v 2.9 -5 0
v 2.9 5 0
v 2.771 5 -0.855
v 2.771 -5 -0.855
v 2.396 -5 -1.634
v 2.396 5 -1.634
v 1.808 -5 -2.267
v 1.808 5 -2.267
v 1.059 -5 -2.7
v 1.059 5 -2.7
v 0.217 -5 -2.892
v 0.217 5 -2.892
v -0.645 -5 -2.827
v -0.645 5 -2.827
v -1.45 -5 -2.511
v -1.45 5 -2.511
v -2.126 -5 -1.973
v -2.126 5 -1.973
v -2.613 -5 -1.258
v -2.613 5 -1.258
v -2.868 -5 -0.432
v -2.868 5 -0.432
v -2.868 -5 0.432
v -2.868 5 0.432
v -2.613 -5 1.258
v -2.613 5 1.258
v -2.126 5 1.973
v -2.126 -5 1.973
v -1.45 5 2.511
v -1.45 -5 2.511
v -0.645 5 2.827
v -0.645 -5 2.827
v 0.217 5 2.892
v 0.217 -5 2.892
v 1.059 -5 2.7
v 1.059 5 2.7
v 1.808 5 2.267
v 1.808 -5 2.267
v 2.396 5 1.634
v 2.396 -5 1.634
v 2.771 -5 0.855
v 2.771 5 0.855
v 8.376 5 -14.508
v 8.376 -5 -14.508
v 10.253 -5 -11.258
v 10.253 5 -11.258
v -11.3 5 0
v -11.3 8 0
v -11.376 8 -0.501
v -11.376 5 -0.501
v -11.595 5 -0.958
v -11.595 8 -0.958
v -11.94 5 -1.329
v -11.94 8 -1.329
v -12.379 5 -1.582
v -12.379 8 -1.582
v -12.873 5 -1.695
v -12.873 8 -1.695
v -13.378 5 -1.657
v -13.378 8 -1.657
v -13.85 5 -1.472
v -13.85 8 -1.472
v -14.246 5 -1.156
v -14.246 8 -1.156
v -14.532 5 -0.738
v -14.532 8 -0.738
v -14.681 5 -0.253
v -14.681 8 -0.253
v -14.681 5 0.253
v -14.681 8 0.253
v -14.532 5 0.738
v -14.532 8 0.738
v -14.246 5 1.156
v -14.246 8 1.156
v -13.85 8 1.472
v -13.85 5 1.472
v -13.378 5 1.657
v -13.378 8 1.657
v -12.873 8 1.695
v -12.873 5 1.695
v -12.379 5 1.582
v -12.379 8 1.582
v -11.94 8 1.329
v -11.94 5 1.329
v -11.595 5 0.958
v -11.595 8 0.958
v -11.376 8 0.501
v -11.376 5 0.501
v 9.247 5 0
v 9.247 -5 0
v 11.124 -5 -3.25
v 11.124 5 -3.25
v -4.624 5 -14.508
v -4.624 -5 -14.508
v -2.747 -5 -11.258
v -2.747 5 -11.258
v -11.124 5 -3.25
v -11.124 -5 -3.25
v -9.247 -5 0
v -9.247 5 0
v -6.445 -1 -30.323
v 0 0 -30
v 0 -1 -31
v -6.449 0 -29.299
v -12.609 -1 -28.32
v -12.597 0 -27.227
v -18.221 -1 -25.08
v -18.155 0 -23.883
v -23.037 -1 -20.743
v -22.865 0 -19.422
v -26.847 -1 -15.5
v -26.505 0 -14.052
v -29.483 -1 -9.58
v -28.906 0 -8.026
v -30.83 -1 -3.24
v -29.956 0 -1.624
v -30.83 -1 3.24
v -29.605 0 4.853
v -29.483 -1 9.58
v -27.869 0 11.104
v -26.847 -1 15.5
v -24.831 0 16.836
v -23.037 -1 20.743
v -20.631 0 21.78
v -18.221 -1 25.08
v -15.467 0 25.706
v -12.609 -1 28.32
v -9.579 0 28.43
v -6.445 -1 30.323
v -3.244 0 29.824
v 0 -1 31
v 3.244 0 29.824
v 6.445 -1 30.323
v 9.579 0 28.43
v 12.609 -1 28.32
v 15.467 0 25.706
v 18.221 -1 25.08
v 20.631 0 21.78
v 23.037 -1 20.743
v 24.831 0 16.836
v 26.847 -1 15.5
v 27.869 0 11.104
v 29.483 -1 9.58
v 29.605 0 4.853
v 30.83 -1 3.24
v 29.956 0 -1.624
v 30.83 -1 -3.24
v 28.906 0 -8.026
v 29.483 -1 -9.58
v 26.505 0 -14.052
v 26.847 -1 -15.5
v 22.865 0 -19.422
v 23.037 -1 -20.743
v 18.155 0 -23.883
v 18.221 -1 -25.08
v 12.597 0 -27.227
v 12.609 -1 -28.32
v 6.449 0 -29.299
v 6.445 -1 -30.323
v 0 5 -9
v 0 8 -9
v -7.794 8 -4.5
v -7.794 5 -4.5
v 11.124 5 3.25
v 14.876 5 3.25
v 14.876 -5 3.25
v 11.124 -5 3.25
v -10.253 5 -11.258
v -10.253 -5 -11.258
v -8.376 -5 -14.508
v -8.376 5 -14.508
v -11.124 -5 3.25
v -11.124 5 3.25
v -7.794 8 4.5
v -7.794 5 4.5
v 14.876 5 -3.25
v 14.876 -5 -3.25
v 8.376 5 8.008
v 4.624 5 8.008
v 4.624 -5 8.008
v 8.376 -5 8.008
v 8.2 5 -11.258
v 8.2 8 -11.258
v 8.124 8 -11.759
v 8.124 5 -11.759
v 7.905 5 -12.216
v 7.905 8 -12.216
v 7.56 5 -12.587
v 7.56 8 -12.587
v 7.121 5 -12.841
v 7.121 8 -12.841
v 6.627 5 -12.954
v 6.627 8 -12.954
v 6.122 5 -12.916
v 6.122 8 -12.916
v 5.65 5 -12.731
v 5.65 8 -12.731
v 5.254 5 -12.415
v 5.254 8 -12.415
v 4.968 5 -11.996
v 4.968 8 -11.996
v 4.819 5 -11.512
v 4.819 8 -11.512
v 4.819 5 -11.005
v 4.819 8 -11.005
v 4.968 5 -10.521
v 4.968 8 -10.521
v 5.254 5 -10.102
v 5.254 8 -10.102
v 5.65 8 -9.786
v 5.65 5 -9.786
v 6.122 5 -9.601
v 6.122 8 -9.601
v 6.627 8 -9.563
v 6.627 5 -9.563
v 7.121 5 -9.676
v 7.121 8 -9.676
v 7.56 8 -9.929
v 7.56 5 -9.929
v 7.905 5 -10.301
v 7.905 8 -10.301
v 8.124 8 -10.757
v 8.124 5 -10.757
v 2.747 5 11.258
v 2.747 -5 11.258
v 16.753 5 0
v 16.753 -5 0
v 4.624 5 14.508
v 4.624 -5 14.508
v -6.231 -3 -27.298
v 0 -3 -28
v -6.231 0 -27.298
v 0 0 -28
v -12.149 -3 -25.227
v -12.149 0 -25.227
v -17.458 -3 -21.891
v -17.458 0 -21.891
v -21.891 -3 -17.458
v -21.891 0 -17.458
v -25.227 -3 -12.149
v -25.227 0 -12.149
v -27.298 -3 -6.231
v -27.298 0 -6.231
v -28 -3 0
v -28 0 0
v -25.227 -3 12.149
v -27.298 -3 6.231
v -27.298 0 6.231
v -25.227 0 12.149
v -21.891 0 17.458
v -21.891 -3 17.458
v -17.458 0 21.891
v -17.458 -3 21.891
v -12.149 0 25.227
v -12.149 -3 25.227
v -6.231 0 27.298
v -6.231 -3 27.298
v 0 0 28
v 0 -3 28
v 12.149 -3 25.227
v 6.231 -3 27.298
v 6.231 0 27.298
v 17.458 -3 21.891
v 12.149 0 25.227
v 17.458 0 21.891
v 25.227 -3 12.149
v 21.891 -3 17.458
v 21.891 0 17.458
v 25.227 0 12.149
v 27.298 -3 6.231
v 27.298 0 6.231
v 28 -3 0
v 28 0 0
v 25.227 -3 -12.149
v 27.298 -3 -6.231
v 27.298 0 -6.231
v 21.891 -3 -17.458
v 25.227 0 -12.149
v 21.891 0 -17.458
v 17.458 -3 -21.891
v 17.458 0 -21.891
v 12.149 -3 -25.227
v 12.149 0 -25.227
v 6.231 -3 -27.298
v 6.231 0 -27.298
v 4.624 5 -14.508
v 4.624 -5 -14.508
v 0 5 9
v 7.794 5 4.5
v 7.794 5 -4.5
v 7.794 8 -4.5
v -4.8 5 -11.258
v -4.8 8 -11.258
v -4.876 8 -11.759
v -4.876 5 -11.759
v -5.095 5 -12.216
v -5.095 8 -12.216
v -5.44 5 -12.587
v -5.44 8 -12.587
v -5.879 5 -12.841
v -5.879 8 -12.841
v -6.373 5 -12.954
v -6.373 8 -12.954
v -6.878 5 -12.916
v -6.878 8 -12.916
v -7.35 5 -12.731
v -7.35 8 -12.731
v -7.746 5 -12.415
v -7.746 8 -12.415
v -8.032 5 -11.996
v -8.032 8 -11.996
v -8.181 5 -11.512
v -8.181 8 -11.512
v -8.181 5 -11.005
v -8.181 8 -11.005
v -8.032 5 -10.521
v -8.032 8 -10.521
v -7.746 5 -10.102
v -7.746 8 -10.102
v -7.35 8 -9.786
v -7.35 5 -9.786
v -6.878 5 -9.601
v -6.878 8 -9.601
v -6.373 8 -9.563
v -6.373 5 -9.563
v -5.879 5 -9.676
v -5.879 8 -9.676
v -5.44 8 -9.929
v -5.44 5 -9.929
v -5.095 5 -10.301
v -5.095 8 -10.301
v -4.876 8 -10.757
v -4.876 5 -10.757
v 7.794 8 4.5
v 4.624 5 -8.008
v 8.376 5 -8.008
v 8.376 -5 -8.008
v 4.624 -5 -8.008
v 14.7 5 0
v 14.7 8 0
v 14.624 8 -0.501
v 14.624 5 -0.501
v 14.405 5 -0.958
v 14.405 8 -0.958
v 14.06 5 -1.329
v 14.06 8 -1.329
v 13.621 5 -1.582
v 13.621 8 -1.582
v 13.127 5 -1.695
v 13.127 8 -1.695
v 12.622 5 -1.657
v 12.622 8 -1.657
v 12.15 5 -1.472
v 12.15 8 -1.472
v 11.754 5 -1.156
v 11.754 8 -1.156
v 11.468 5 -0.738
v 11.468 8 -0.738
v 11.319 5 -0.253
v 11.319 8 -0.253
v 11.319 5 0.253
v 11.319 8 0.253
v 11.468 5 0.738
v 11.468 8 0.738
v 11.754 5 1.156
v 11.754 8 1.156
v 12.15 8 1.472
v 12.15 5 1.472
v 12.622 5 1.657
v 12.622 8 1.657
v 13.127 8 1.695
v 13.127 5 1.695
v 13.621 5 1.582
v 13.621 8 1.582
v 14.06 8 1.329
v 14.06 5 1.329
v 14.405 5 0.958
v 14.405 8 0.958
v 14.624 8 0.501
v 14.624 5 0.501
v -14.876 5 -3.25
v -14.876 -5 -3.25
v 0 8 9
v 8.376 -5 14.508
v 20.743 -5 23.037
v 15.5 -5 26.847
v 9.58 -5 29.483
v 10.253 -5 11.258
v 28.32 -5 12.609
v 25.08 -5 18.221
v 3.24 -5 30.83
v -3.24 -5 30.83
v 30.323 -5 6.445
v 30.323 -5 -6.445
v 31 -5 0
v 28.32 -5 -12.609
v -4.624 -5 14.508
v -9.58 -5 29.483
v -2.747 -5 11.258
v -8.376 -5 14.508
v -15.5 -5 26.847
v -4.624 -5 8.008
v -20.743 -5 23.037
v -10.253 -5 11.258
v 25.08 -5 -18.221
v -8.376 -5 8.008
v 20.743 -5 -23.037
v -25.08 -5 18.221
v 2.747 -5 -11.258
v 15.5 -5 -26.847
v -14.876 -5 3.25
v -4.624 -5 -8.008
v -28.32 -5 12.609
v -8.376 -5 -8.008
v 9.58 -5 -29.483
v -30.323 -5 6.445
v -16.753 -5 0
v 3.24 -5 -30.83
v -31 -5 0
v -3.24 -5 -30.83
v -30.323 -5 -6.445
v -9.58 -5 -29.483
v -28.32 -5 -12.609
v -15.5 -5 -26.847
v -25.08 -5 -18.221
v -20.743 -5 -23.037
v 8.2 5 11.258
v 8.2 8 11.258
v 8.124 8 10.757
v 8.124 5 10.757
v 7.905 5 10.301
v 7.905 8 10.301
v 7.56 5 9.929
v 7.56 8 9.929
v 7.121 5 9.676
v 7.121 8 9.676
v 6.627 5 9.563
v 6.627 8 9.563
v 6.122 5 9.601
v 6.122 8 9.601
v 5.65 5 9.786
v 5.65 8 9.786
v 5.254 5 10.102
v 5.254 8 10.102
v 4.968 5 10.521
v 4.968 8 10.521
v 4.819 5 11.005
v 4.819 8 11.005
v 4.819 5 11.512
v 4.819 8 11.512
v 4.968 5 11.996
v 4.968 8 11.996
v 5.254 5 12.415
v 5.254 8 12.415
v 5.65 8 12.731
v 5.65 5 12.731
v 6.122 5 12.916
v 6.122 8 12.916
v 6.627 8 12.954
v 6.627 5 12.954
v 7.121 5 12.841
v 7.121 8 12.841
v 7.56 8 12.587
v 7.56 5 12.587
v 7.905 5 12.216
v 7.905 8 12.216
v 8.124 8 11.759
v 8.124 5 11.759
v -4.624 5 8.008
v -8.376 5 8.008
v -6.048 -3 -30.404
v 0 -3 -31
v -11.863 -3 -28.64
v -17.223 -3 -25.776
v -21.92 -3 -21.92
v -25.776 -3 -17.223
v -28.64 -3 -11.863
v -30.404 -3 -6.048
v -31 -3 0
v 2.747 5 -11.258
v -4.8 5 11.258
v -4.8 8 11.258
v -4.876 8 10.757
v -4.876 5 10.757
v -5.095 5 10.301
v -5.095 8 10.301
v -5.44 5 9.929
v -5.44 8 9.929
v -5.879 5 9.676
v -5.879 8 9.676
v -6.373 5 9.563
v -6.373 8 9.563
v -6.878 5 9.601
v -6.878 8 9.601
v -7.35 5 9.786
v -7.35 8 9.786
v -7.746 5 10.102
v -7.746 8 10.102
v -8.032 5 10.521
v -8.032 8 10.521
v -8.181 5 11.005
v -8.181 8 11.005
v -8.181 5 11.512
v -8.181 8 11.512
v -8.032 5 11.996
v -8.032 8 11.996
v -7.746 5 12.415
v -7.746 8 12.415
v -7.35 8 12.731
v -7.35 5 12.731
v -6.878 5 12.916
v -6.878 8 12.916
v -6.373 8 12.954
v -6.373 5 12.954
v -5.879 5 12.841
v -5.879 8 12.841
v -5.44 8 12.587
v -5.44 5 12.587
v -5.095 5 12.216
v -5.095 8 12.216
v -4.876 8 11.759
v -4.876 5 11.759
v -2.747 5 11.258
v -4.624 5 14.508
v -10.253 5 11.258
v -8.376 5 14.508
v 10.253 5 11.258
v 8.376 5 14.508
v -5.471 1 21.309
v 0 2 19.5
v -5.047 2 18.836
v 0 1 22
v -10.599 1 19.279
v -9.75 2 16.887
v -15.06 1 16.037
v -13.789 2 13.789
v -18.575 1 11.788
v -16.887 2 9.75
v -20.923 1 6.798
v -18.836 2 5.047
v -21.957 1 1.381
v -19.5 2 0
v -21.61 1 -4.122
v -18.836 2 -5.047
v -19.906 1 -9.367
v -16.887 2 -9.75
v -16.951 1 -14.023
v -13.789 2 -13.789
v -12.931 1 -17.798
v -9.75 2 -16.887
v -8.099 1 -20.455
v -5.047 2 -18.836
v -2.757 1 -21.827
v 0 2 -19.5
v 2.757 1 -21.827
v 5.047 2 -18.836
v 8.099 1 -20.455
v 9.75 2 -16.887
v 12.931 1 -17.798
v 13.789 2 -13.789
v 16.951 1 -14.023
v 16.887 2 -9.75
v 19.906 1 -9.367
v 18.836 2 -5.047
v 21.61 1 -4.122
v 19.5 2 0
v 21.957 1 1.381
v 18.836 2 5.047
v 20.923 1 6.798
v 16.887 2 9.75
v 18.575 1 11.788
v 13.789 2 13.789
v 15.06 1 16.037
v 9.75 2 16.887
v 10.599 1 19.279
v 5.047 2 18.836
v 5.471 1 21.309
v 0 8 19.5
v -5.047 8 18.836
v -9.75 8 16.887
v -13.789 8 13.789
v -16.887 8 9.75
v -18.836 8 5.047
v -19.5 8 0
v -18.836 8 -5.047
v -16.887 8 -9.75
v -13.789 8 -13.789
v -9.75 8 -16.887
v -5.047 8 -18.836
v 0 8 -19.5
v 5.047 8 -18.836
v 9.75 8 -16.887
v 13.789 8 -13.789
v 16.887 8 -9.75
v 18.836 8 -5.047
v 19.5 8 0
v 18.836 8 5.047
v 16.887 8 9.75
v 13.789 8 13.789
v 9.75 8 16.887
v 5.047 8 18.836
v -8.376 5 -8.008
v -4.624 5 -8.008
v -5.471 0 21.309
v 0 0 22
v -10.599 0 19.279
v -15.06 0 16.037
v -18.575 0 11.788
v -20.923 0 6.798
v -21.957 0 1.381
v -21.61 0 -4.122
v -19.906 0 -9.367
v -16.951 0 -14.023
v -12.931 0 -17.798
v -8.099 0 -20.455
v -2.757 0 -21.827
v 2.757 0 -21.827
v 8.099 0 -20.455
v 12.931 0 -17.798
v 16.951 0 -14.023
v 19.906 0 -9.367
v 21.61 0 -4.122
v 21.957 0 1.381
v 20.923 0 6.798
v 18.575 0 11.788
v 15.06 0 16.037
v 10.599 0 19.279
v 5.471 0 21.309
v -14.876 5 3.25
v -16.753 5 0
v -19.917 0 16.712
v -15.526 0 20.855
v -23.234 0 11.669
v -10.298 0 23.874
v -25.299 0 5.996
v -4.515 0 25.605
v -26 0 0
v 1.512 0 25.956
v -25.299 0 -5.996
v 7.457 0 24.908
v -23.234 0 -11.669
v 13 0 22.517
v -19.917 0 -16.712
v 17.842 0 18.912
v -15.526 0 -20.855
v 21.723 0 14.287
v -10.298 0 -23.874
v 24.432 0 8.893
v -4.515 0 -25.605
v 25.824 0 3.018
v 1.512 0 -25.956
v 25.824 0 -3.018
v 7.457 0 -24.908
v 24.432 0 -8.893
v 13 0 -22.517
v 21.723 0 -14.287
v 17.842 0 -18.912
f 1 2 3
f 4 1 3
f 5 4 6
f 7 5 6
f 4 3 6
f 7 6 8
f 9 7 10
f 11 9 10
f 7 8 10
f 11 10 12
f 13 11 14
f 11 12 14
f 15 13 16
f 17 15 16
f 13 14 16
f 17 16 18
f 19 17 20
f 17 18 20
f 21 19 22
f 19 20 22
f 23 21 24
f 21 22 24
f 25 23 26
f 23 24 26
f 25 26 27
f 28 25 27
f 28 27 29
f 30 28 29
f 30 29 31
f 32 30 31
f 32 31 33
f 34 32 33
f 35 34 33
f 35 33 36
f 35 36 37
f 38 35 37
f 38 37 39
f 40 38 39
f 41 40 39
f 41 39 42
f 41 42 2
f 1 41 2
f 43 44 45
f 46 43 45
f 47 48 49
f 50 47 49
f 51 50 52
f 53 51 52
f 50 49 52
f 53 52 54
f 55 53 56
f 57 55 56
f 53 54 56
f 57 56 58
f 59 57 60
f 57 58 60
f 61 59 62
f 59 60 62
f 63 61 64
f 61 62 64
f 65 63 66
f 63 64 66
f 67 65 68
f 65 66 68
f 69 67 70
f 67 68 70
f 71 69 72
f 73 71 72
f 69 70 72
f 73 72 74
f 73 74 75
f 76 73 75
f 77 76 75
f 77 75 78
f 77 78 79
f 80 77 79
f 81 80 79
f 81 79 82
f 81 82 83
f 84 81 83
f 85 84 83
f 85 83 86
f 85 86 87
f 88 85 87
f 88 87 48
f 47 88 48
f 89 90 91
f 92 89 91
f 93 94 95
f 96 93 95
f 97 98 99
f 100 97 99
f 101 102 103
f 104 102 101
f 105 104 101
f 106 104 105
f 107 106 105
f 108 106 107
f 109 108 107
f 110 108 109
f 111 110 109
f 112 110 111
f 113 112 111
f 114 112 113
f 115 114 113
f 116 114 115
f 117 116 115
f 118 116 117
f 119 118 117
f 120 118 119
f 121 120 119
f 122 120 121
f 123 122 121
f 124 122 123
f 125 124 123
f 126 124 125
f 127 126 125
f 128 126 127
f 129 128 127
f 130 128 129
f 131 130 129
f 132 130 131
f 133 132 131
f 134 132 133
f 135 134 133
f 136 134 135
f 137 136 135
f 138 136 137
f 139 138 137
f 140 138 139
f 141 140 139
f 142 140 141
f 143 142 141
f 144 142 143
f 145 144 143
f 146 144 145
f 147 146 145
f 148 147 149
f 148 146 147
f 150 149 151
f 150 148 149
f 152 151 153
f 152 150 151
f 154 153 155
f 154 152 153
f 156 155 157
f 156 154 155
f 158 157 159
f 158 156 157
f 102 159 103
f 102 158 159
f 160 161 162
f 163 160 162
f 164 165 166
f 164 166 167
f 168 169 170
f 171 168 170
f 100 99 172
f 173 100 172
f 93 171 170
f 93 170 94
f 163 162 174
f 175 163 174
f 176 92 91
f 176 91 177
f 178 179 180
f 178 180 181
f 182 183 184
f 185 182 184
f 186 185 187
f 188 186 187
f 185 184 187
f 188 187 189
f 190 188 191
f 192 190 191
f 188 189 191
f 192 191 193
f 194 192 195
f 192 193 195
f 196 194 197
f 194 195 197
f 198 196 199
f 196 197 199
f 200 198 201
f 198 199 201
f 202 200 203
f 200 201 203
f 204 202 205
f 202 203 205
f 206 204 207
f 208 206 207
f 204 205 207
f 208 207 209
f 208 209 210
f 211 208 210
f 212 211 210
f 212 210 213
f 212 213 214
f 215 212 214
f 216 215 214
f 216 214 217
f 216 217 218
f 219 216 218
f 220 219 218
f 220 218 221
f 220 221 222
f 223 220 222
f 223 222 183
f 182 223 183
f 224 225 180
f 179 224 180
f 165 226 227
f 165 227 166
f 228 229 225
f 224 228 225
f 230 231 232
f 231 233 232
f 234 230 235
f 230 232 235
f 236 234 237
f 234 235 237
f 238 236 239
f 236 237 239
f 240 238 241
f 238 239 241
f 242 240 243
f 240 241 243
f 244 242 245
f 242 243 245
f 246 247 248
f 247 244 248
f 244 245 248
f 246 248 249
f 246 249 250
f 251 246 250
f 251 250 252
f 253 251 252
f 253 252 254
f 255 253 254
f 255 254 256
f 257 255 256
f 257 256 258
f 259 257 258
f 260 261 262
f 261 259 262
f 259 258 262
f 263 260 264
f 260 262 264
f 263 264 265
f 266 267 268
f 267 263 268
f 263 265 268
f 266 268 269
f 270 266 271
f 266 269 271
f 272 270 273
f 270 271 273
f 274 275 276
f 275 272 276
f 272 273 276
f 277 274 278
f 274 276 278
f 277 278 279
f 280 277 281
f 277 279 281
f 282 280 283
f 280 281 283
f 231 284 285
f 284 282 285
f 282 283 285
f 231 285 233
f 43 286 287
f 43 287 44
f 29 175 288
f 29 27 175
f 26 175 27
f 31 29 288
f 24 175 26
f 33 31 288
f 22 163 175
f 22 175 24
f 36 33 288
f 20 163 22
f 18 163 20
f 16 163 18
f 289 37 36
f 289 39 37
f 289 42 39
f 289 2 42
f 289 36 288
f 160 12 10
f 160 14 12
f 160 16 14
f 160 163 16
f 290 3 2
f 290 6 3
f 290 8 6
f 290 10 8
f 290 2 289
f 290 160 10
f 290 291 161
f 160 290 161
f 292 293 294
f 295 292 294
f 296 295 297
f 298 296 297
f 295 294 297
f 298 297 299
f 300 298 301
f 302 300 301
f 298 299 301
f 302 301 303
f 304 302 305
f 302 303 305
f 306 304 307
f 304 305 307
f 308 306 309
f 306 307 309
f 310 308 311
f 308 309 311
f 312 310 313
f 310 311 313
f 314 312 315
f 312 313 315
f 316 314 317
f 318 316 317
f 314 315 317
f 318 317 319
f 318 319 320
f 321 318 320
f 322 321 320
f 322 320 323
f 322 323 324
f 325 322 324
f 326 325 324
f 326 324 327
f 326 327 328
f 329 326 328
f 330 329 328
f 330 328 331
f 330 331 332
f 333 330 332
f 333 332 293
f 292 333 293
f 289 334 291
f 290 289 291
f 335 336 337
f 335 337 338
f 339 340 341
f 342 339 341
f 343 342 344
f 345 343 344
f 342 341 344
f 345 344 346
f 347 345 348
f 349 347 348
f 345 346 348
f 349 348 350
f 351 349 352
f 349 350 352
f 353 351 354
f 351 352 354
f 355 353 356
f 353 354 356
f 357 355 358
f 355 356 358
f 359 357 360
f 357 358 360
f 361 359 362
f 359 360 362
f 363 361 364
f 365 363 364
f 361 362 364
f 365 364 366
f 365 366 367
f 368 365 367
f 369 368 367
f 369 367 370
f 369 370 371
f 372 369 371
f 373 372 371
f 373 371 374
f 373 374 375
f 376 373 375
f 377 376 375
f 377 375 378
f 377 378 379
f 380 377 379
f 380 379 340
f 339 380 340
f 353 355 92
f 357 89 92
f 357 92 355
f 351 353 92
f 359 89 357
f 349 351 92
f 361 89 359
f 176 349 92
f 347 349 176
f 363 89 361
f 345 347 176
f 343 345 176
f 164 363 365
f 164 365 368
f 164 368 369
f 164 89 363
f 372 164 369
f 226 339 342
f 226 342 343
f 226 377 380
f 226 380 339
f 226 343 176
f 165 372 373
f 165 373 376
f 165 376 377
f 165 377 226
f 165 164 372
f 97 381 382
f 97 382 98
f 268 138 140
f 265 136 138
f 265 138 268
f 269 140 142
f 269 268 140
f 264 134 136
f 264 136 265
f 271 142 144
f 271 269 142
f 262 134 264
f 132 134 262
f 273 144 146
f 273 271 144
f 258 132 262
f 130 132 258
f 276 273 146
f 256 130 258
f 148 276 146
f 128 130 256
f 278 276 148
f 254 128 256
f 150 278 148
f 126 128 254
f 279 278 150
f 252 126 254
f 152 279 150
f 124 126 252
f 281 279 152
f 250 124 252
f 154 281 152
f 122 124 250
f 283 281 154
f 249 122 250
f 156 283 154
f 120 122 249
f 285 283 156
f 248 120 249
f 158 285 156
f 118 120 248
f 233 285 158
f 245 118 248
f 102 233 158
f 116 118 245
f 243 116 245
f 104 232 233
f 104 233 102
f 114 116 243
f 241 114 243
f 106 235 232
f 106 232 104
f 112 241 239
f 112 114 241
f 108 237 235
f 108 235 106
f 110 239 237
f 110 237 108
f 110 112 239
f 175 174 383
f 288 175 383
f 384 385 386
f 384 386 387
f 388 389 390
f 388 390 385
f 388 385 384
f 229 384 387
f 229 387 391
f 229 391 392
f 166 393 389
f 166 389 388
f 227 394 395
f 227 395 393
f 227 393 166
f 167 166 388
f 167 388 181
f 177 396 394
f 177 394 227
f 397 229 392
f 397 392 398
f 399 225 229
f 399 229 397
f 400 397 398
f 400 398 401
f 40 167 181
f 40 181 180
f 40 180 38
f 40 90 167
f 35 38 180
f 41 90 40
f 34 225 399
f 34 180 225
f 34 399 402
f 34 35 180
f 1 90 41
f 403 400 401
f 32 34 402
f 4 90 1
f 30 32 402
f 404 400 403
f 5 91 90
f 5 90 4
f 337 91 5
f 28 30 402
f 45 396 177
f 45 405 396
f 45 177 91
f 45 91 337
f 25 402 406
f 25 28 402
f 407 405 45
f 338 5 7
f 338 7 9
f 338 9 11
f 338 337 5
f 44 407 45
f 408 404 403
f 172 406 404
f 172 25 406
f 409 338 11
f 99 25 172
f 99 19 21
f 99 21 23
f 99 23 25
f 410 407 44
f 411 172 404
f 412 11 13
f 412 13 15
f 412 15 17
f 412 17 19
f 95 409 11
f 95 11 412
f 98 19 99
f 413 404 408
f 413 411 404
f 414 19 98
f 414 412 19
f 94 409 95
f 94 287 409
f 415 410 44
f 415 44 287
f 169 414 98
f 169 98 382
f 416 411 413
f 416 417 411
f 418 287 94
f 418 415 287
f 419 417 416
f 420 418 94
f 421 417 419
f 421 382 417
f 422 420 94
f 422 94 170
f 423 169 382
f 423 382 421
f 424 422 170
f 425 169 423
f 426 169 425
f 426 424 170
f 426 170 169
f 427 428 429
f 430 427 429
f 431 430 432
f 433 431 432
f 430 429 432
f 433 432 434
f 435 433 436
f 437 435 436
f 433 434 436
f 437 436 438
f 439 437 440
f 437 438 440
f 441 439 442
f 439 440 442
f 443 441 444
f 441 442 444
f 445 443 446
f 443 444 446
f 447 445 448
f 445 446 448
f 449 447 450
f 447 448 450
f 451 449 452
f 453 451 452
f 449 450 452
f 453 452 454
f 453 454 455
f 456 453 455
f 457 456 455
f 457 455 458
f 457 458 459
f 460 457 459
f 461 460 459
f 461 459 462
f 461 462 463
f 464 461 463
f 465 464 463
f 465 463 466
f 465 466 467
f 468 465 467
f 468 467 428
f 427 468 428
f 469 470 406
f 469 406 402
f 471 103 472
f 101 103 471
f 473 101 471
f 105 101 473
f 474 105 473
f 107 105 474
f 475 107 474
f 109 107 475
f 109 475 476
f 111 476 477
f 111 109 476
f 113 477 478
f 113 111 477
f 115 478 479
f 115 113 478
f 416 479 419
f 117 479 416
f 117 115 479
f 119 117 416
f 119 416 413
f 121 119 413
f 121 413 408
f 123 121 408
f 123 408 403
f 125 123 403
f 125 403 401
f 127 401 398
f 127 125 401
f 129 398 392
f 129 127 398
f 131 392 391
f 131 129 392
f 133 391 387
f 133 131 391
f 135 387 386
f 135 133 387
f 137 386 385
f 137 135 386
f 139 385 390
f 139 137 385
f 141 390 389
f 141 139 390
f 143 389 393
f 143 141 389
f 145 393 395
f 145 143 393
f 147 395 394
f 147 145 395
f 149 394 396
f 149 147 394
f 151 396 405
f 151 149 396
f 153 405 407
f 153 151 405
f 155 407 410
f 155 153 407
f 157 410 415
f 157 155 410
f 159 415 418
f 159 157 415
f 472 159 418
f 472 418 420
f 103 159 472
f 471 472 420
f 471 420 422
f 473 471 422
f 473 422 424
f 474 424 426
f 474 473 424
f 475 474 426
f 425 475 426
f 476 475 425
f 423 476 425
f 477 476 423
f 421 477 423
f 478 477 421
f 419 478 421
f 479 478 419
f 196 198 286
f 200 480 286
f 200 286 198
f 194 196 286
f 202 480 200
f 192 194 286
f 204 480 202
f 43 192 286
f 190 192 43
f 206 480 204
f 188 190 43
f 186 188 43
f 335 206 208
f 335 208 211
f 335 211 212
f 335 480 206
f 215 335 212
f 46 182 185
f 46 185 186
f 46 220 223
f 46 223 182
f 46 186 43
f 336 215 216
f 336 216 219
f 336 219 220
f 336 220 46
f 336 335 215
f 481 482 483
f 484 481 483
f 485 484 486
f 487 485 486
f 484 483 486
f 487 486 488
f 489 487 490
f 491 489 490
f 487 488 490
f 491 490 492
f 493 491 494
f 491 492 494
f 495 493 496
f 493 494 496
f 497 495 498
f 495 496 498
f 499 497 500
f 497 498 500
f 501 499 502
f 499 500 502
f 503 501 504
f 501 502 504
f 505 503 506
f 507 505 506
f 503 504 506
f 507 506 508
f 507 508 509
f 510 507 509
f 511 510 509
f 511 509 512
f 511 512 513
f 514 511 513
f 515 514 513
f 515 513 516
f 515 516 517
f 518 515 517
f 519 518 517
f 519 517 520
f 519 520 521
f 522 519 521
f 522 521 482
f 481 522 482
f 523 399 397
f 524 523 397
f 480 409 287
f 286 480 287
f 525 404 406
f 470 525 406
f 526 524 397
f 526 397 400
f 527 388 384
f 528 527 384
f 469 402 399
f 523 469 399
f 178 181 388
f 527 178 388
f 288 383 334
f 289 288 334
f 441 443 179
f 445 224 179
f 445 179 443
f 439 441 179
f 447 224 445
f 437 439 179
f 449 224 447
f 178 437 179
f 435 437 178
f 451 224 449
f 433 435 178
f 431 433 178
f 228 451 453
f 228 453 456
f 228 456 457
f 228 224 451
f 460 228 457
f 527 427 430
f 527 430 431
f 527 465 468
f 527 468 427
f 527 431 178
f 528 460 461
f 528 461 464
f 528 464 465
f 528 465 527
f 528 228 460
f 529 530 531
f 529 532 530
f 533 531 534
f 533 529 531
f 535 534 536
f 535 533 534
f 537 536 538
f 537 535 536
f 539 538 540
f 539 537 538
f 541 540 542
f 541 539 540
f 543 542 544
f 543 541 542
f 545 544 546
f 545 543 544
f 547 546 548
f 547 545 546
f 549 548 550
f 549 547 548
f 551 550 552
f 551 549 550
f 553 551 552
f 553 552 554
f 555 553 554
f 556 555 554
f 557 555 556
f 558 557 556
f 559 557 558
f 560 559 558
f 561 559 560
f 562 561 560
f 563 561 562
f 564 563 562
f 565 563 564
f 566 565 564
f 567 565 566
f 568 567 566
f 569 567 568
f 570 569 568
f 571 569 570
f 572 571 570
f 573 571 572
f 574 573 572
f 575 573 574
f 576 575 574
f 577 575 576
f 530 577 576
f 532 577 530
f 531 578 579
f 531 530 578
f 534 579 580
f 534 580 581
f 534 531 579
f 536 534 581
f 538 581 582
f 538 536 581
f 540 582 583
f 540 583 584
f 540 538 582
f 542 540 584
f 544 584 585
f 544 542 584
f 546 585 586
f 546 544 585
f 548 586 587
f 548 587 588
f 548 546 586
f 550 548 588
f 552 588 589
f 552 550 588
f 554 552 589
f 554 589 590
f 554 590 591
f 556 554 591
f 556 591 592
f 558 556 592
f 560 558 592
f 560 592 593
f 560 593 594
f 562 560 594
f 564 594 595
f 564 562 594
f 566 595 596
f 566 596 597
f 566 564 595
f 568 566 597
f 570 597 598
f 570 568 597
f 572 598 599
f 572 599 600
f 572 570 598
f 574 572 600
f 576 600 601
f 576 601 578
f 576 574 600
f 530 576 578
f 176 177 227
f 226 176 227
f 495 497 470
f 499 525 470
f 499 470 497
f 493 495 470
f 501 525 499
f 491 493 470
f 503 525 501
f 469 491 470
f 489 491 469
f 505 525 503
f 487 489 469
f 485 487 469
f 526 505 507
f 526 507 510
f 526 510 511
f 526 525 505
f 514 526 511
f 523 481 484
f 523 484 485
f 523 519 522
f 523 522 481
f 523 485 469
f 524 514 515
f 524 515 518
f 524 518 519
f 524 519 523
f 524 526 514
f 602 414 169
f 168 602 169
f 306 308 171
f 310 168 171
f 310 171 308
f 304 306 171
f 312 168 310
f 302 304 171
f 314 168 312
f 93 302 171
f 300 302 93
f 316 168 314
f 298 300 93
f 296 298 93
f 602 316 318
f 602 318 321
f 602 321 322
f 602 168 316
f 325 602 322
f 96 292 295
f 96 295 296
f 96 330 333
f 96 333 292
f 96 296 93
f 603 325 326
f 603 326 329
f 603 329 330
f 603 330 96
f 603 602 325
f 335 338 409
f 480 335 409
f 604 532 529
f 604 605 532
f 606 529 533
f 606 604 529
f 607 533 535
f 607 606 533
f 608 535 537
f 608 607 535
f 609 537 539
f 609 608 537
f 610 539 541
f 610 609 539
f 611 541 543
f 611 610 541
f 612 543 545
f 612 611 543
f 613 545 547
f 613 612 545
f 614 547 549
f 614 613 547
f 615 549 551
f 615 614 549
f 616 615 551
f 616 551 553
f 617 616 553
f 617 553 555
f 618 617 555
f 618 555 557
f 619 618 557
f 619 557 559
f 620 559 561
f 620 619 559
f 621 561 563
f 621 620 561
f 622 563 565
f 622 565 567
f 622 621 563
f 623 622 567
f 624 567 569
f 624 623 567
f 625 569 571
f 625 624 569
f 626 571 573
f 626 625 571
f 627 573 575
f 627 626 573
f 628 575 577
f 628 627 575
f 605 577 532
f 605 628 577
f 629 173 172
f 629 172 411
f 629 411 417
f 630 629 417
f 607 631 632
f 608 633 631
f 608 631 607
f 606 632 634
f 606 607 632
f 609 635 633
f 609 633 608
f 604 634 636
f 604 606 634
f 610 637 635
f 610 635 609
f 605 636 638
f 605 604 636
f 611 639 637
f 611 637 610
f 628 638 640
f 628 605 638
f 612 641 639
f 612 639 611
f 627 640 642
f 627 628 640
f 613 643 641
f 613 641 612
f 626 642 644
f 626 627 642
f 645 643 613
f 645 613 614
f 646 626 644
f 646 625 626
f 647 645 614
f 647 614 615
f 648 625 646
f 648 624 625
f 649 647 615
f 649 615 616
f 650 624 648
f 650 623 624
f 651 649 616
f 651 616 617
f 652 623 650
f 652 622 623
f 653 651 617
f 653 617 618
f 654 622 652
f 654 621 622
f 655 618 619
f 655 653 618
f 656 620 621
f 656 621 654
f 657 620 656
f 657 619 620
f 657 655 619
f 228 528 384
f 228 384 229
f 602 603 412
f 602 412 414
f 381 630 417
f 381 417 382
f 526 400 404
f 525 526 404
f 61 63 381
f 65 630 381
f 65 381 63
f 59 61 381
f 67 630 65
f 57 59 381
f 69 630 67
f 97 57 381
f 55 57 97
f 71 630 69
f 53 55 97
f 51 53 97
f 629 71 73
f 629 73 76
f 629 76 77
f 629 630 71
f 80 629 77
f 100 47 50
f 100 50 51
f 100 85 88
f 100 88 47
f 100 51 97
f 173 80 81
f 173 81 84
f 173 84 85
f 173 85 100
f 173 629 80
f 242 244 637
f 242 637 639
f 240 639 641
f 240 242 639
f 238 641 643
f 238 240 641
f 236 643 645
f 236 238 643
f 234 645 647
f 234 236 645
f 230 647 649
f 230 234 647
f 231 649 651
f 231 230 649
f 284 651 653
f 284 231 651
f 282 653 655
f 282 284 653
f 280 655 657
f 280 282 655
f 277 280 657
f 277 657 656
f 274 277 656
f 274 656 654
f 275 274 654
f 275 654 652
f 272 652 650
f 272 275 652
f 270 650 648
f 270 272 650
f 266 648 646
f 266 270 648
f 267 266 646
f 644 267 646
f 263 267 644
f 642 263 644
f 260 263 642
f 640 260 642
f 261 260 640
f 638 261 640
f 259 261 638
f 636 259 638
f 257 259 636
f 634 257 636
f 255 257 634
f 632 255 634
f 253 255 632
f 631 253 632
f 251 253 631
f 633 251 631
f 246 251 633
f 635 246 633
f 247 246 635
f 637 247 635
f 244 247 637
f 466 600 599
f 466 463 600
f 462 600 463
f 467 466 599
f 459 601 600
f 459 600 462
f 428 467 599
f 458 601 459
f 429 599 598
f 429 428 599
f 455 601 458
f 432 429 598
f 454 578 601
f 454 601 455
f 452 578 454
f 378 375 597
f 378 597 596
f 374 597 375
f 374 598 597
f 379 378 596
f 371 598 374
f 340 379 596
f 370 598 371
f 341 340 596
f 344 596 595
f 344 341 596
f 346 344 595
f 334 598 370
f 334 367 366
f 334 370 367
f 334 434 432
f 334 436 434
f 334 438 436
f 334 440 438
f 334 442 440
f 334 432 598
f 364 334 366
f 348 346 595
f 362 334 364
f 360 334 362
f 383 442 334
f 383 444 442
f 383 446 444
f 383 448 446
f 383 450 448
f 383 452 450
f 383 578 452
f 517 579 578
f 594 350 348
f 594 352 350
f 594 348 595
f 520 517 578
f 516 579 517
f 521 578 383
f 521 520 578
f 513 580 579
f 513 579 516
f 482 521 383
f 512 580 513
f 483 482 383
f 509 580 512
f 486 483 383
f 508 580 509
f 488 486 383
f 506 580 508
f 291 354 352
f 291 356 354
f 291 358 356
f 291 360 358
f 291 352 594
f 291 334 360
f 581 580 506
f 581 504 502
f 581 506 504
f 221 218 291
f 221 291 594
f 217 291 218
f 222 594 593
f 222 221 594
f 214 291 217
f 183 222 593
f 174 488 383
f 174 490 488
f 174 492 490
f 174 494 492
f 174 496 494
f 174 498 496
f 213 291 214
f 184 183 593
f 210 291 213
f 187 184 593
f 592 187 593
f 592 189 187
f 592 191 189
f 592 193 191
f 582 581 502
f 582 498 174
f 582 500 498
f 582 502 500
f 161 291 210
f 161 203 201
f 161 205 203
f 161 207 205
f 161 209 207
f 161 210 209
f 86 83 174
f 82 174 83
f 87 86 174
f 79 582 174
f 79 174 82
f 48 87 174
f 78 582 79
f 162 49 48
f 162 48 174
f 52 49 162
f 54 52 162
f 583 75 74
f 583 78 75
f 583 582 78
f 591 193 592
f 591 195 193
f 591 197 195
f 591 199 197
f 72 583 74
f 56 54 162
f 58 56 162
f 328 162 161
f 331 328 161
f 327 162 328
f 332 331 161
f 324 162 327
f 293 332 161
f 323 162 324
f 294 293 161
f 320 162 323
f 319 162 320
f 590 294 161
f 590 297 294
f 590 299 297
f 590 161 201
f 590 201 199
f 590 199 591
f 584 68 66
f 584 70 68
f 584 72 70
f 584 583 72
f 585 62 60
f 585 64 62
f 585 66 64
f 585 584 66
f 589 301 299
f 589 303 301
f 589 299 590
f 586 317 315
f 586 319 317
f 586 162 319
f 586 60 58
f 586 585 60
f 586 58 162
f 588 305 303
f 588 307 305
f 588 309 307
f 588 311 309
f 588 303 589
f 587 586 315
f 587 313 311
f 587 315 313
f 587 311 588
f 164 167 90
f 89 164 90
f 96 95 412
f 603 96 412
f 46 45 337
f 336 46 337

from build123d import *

# Parameters (mm, degrees)
CUT_EXTRUDE_1_DEPTH = 10
HOLE_WIZARD_M31_D   = 3.4
SKETCH_10_W         = 3
SKETCH_10_H         = 3
CHAMFER_3_SIZE      = 1
CUT_EXTRUDE_2_DEPTH = 3
HOLE_WIZARD_M51_D   = 5.8


with BuildPart() as part:
    # Эскиз2 → Повернуть1 (revolve)
    with BuildSketch(Plane.XY, mode=Mode.PRIVATE) as revolve_1_sk:
        Polygon((-19.5, 2), (-22, 1), (-22, 0), (0, 0), (0, 8), (-19.5, 8), align=None)
    revolve(revolve_1_sk.sketch.rotate(Axis((0, 8, 0), (0, -1, 0)), 270), axis=Axis((0, 8, 0), (0, -1, 0)))

    # Эскиз4 → Повернуть2 (revolve)
    with BuildSketch(Plane.XY, mode=Mode.PRIVATE) as revolve_2_sk:
        Polygon((0, 0), (26, 0), (28, -3), (31, -3), (31, -5), (0, -5), (0, -3), align=None)
    revolve(revolve_2_sk.sketch.rotate(Axis((0, -3, 0), (0, -1, 0)), 180), axis=Axis((0, -3, 0), (0, -1, 0)))

    # Эскиз6 → Вырез-Вытянуть1 (cut)
    with BuildSketch(Plane.XZ.offset(5)):
        Polygon((2.74722325, -11.258330249), (4.623611625, -14.508330249), (8.376388375, -14.508330249), (10.25277675, -11.258330249), (8.376388375, -8.008330249), (4.623611625, -8.008330249), align=None)
        Polygon((-10.25277675, -11.258330249), (-8.376388375, -14.508330249), (-4.623611625, -14.508330249), (-2.74722325, -11.258330249), (-4.623611625, -8.008330249), (-8.376388375, -8.008330249), align=None)
        Polygon((-16.75277675, 0), (-14.876388375, -3.25), (-11.123611625, -3.25), (-9.24722325, 0), (-11.123611625, 3.25), (-14.876388375, 3.25), align=None)
        Polygon((-10.25277675, 11.258330249), (-8.376388375, 8.008330249), (-4.623611625, 8.008330249), (-2.74722325, 11.258330249), (-4.623611625, 14.508330249), (-8.376388375, 14.508330249), align=None)
        Polygon((2.74722325, 11.258330249), (4.623611625, 8.008330249), (8.376388375, 8.008330249), (10.25277675, 11.258330249), (8.376388375, 14.508330249), (4.623611625, 14.508330249), align=None)
        Polygon((9.24722325, 0), (11.123611625, -3.25), (14.876388375, -3.25), (16.75277675, 0), (14.876388375, 3.25), (11.123611625, 3.25), align=None)
    extrude(amount=-CUT_EXTRUDE_1_DEPTH, mode=Mode.SUBTRACT)

    # Отверстие с зазором M31 (through all)
    with Locations(Plane(origin=(0, 5, 0), x_dir=(-1, 0, 0), z_dir=(0, -1, 0))):
        with Locations((6.5, -11.258330249), (13, 0), (6.5, 11.258330249), (-6.5, 11.258330249), (-13, 0), (-6.5, -11.258330249)):
            Hole(HOLE_WIZARD_M31_D / 2)

    # Эскиз10 → Повернуть3 (revolve)
    with BuildSketch(Plane.XY, mode=Mode.PRIVATE) as revolve_3_sk:
        with Locations((-29.5, -1.5)):
            Rectangle(SKETCH_10_W, SKETCH_10_H)
    revolve(revolve_3_sk.sketch.rotate(Axis((0, -2.994452998, 0), (0, 1, 0)), 270), axis=Axis((0, -2.994452998, 0), (0, 1, 0)))

    # Фаска3
    chamfer_3_edges = [part.edges().sort_by_distance(p)[0] for p in [
        (0, 0, 31),
    ]]
    chamfer(chamfer_3_edges, length=CHAMFER_3_SIZE)

    # Эскиз11 → Вырез-Вытянуть2 (cut)
    with BuildSketch(Plane(origin=(0, 8, 0), x_dir=(1, 0, 0), z_dir=(0, 1, 0))):
        Polygon((7.794228634, -4.5), (7.794228634, 4.5), (0, 9), (-7.794228634, 4.5), (-7.794228634, -4.5), (0, -9), align=None)
    extrude(amount=-CUT_EXTRUDE_2_DEPTH, mode=Mode.SUBTRACT)

    # Отверстие с зазором M51 (through all)
    with Locations(Plane(origin=(0, -5, 0), x_dir=(-1, 0, 0), z_dir=(0, -1, 0))):
        with Locations((0, 0)):
            Hole(HOLE_WIZARD_M51_D / 2)


solid = part.part
